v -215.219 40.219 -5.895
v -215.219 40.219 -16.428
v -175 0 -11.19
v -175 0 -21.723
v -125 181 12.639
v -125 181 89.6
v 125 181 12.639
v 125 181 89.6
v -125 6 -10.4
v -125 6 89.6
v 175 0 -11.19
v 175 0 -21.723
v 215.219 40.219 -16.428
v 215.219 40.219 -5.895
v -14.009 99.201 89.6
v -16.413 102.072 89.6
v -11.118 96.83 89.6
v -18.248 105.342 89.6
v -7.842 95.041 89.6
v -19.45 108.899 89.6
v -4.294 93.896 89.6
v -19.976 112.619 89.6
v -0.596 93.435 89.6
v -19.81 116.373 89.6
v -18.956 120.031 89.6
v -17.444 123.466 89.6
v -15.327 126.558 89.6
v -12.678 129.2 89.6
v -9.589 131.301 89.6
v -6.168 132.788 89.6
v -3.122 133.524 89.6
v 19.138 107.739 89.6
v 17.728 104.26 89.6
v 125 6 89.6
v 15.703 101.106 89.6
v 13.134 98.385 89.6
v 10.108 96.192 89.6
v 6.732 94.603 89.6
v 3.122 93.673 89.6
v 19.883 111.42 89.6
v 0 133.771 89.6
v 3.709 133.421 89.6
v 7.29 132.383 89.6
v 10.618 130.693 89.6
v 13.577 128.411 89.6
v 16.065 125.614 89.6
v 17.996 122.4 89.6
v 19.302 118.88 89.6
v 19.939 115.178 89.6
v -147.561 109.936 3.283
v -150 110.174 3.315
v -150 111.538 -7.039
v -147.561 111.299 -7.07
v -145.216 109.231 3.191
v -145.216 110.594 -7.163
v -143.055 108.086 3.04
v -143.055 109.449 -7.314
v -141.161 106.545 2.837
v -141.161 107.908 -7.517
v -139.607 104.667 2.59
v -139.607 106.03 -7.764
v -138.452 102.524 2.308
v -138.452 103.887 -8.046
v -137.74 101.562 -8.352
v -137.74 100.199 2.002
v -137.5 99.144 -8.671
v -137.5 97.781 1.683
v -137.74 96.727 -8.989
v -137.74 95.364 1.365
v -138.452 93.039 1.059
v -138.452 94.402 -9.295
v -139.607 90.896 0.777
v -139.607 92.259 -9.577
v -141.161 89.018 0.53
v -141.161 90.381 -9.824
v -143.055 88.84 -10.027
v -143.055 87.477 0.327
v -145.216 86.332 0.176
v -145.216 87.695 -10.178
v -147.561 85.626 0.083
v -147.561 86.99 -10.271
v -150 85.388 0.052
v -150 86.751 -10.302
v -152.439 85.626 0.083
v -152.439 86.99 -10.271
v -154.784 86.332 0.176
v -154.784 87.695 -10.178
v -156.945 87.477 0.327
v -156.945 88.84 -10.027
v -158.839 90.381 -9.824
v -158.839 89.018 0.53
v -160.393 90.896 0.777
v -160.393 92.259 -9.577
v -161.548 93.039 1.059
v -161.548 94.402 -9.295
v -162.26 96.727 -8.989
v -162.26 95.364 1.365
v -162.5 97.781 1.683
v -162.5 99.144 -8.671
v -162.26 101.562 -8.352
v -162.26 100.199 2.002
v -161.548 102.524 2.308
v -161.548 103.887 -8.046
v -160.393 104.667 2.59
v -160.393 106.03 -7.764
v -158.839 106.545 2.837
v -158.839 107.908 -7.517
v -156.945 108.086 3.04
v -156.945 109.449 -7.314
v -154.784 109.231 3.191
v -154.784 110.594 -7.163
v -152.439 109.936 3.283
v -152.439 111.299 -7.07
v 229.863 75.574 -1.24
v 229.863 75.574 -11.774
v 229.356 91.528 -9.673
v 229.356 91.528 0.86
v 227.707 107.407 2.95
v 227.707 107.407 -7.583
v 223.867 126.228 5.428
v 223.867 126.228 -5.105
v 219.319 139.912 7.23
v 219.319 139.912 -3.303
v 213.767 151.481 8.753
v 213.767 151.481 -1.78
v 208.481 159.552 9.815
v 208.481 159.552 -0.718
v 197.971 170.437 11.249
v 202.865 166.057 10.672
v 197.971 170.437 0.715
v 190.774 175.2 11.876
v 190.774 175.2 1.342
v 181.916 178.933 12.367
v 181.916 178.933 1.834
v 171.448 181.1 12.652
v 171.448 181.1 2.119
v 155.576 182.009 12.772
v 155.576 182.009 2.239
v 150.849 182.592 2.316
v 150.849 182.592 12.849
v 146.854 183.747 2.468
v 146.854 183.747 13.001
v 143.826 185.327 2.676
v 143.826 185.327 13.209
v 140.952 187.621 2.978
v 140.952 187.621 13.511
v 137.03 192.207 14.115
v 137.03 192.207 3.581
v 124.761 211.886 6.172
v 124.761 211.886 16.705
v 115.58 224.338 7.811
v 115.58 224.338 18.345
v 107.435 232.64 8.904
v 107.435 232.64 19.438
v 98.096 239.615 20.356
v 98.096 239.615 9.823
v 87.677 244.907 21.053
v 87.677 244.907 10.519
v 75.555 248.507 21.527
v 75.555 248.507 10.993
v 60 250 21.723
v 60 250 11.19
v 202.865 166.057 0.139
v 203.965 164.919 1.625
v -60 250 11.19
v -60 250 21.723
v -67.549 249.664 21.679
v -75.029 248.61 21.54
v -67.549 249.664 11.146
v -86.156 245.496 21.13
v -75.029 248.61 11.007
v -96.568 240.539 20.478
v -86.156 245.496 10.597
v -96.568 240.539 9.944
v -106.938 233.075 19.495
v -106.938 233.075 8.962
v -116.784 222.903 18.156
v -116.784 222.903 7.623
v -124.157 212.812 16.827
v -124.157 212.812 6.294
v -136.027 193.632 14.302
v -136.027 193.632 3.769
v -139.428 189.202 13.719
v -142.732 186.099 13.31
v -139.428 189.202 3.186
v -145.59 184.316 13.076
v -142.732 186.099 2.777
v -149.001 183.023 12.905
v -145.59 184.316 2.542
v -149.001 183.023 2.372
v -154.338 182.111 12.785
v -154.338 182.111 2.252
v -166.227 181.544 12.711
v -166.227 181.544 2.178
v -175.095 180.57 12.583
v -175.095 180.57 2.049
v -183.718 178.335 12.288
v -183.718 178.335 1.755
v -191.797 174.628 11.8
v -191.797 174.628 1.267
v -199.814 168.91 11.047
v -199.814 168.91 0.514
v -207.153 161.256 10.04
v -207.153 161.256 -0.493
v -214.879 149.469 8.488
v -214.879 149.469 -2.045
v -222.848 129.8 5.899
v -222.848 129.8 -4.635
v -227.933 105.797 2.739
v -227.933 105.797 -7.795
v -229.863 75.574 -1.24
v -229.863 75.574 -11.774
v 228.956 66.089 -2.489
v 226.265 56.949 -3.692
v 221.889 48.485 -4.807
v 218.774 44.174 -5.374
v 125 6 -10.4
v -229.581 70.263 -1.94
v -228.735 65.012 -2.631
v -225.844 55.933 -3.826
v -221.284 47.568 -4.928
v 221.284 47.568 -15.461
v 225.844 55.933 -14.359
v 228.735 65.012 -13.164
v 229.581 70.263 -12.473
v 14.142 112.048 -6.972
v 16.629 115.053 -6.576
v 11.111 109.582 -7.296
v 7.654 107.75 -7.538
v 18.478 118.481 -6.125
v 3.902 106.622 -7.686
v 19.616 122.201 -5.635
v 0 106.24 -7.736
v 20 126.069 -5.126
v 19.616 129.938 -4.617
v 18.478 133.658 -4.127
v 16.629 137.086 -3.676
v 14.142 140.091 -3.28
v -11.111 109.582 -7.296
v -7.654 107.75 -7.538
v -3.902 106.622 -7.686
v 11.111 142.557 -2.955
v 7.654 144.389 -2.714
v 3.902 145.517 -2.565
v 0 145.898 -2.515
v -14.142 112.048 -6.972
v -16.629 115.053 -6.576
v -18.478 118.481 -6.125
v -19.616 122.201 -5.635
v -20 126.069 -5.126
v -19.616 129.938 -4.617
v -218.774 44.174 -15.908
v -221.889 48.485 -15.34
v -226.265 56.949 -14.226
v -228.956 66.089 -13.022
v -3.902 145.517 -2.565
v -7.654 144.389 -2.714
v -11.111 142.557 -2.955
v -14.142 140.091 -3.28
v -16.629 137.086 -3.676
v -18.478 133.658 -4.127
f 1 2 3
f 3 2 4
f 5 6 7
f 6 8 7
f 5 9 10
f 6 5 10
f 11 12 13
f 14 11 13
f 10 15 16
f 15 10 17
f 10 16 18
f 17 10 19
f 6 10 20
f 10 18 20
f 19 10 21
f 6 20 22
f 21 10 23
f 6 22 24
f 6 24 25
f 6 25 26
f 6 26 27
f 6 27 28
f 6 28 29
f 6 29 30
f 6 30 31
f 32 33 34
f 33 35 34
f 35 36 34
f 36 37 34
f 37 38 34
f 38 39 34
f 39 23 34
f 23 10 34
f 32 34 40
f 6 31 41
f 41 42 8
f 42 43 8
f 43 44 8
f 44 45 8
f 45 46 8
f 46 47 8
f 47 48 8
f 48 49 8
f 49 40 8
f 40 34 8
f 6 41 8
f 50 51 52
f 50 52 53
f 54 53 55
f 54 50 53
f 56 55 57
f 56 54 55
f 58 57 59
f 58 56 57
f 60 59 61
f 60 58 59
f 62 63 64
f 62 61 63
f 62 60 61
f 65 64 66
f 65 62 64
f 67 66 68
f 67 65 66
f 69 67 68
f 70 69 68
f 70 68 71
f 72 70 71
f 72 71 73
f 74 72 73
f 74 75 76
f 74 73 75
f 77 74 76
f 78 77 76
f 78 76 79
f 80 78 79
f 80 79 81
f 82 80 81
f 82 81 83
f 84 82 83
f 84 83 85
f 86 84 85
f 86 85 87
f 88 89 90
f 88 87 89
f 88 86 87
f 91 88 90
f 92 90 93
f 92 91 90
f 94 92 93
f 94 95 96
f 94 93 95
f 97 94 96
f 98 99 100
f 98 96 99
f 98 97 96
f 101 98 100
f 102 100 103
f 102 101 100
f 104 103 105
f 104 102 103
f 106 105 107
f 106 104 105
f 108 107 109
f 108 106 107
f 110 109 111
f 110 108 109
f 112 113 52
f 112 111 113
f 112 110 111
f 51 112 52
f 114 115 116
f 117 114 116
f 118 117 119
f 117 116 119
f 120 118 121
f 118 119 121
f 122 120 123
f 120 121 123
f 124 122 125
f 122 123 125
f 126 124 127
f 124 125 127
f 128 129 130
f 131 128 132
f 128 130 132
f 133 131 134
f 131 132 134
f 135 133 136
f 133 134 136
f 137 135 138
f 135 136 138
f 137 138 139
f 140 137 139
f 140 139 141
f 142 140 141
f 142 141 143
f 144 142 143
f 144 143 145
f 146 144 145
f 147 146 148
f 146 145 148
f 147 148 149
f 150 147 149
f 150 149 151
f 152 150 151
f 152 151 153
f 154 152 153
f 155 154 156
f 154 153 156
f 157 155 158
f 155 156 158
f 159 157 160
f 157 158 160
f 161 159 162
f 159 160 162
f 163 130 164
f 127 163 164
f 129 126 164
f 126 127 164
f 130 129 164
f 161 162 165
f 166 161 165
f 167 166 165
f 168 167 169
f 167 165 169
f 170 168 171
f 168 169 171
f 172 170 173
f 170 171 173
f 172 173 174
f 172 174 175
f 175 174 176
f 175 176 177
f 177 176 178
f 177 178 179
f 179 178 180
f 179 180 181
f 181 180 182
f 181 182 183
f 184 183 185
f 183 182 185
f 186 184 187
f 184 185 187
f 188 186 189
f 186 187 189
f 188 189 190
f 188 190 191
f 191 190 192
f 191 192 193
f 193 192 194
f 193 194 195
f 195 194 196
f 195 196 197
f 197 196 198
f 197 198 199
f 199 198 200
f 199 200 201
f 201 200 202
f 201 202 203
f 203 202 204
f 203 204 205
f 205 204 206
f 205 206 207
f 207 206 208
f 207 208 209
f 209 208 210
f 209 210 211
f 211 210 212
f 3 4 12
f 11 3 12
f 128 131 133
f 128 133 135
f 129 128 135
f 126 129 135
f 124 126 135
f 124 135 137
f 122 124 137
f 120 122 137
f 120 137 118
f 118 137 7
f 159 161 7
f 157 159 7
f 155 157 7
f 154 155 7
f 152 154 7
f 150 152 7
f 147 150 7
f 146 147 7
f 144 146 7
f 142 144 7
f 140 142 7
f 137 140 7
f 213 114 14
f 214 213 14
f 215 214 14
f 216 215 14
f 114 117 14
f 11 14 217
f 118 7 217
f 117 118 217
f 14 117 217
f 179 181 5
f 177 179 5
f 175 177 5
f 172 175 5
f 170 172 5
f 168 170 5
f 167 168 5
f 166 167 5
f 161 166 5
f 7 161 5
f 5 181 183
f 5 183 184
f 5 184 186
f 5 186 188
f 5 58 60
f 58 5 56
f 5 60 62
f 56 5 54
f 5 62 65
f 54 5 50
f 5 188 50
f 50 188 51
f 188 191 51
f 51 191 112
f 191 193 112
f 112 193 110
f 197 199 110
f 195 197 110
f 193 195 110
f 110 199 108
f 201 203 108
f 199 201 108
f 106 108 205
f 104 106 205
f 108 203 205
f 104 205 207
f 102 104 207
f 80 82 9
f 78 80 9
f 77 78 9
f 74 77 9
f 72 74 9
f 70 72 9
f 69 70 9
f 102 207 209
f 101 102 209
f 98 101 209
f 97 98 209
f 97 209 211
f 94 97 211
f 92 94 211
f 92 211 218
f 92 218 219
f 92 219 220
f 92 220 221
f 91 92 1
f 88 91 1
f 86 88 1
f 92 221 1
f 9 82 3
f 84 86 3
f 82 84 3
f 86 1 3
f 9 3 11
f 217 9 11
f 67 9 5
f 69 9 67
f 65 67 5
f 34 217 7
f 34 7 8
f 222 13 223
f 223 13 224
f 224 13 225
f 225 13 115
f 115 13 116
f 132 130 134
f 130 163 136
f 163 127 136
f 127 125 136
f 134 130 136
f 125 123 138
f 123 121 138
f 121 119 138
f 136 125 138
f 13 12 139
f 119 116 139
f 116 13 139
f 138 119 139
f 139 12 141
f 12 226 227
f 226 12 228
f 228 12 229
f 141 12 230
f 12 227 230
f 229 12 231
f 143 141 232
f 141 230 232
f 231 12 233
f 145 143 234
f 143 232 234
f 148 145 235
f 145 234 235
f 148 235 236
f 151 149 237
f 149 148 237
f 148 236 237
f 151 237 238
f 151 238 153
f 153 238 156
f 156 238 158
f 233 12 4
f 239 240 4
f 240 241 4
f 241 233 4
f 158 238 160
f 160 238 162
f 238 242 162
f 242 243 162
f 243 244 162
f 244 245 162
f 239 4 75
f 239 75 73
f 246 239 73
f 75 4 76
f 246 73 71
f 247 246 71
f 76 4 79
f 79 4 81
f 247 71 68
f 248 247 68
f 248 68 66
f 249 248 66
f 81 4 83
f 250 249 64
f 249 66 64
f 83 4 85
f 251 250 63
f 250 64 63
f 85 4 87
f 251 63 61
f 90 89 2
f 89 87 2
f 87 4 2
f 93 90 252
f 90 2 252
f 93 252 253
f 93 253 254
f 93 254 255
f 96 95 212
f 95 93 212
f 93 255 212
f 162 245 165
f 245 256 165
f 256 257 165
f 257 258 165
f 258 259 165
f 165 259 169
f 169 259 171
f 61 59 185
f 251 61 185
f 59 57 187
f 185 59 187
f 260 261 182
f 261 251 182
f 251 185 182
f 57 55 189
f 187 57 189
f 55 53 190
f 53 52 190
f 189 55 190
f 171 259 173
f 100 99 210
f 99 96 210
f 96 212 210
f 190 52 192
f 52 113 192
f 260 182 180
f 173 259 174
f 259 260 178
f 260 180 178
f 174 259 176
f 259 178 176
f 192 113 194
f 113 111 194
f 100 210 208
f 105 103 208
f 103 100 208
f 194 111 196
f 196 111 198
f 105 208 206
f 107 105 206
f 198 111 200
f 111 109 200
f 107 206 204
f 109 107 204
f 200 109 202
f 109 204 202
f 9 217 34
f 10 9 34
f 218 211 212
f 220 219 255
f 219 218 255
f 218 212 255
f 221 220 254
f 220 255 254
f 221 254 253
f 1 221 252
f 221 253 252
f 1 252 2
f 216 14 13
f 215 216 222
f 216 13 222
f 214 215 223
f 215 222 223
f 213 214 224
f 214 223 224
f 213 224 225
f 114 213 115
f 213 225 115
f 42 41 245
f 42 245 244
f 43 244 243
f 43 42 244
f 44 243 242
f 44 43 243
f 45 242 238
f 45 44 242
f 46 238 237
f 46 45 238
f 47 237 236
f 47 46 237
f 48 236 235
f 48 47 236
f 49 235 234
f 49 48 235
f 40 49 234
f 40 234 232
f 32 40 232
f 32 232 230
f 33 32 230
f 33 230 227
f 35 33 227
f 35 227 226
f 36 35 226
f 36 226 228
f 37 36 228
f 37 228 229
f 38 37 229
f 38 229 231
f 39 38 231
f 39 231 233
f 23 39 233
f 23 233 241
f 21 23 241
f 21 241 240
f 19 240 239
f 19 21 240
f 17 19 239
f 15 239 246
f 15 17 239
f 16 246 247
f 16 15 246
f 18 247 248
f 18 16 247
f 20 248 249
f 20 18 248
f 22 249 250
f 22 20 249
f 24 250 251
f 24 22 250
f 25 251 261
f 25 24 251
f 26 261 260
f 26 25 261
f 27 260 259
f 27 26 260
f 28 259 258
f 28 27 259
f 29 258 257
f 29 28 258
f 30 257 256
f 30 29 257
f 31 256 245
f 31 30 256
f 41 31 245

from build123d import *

# Parameters (mm, degrees)
BOSS_EXTRUDE1_START     = -25
BOSS_EXTRUDE1_DEPTH     = 50
CUT_EXTRUDE1_DEPTH      = 341.53226913
CUT_EXTRUDE1_DEPTH_BACK = 341.53226913
BOSS_EXTRUDE2_DEPTH     = 125
CUT_EXTRUDE2_DEPTH      = 356.316937075
CUT_EXTRUDE2_DEPTH_BACK = 356.316937075
SKETCH4_R               = 20
CUT_EXTRUDE3_DEPTH      = 356.316937075
CUT_EXTRUDE3_DEPTH_BACK = 356.316937075
SKETCH6_R               = 12.5


# Read off the part's stored shape, not the designer's step: Boss-Extrude1
with BuildPart() as part:
    # Boss-Extrude1 outline → Boss-Extrude1 (new body)
    with BuildSketch(Plane.XY.offset(BOSS_EXTRUDE1_START)):
        with BuildLine():
            Line((175, 0), (215.218833807, 40.218833807))
            ThreePointArc((215.218833807, 40.218833807), (226.057471223, 56.440000887), (229.863494748, 75.574172084))
            add(Edge.make_bspline(
                [(229.863494748, 75.574172084), (229.863497015, 220.574172084), (130.657195822, 208), (130.657198498, 108), (160, 250), (60, 250)],
                knots=[0, 0, 0, 0, 0, 0, 1, 1, 1, 1, 1, 1], degree=5))
            Line((60, 250), (-60, 250))
            add(Edge.make_bspline(
                [(-60, 250), (-160, 250), (-130.657198498, 108), (-130.657195822, 208), (-229.863497015, 220.574172084), (-229.863494748, 75.574172084)],
                knots=[0, 0, 0, 0, 0, 0, 1, 1, 1, 1, 1, 1], degree=5))
            ThreePointArc((-229.863494748, 75.574172084), (-226.057471223, 56.440000887), (-215.218833807, 40.218833807))
            Line((-215.218833807, 40.218833807), (-175, 0))
            Line((-175, 0), (175, 0))
        make_face()
    extrude(amount=BOSS_EXTRUDE1_DEPTH)

    # Sketch2 → Cut-Extrude1 (cut, two sides: drawn at the far end of the back side and taken through both)
    with BuildSketch(Plane(origin=(0, 0, 0), x_dir=(0, 0, -1), z_dir=(1, 0, 0)).offset(-CUT_EXTRUDE1_DEPTH_BACK)):
        Polygon((23.039732542, -10), (-12.506441807, 260), (35, 260), (35, -10), align=None)
        Polygon((-23.039732542, 260), (12.506441807, -10), (-35, -10), (-35, 260), align=None)
    extrude(amount=CUT_EXTRUDE1_DEPTH + CUT_EXTRUDE1_DEPTH_BACK, mode=Mode.SUBTRACT)

    # Sketch7 → Boss-Extrude2 (add, symmetric)
    with BuildSketch(Plane(origin=(0, 0, 0), x_dir=(0, 0, -1), z_dir=(1, 0, 0))):
        Polygon((-89.599998155, 6), (-89.599998155, 181), (-12.639185232, 181), (10.400001845, 6), align=None)
    extrude(amount=BOSS_EXTRUDE2_DEPTH, both=True)

    # Sketch4 → Cut-Extrude2 (cut, two sides: drawn at the far end of the back side and taken through both)
    with BuildSketch(Plane(origin=(0, 2.811189919, -21.353107392), x_dir=(-1, 0, 0), z_dir=(0, 0.13052619222005532, -0.99144486137381)).offset(-CUT_EXTRUDE2_DEPTH_BACK)):
        with Locations(Location((0, 124.321792579, 0), (0, 0, 90))):
            Circle(SKETCH4_R)
    extrude(amount=CUT_EXTRUDE2_DEPTH + CUT_EXTRUDE2_DEPTH_BACK, mode=Mode.SUBTRACT)

    # Sketch6 → Cut-Extrude3 (cut, two sides: drawn at the far end of the back side and taken through both)
    with BuildSketch(Plane(origin=(0, 2.811189919, -21.353107392), x_dir=(-1, 0, 0), z_dir=(0, 0.13052619222005532, -0.99144486137381)).offset(-CUT_EXTRUDE3_DEPTH_BACK)):
        with Locations(Location((150, 97.164552434, 0), (0, 0, 90))):
            Circle(SKETCH6_R)
    extrude(amount=CUT_EXTRUDE3_DEPTH + CUT_EXTRUDE3_DEPTH_BACK, mode=Mode.SUBTRACT)


solid = part.part
